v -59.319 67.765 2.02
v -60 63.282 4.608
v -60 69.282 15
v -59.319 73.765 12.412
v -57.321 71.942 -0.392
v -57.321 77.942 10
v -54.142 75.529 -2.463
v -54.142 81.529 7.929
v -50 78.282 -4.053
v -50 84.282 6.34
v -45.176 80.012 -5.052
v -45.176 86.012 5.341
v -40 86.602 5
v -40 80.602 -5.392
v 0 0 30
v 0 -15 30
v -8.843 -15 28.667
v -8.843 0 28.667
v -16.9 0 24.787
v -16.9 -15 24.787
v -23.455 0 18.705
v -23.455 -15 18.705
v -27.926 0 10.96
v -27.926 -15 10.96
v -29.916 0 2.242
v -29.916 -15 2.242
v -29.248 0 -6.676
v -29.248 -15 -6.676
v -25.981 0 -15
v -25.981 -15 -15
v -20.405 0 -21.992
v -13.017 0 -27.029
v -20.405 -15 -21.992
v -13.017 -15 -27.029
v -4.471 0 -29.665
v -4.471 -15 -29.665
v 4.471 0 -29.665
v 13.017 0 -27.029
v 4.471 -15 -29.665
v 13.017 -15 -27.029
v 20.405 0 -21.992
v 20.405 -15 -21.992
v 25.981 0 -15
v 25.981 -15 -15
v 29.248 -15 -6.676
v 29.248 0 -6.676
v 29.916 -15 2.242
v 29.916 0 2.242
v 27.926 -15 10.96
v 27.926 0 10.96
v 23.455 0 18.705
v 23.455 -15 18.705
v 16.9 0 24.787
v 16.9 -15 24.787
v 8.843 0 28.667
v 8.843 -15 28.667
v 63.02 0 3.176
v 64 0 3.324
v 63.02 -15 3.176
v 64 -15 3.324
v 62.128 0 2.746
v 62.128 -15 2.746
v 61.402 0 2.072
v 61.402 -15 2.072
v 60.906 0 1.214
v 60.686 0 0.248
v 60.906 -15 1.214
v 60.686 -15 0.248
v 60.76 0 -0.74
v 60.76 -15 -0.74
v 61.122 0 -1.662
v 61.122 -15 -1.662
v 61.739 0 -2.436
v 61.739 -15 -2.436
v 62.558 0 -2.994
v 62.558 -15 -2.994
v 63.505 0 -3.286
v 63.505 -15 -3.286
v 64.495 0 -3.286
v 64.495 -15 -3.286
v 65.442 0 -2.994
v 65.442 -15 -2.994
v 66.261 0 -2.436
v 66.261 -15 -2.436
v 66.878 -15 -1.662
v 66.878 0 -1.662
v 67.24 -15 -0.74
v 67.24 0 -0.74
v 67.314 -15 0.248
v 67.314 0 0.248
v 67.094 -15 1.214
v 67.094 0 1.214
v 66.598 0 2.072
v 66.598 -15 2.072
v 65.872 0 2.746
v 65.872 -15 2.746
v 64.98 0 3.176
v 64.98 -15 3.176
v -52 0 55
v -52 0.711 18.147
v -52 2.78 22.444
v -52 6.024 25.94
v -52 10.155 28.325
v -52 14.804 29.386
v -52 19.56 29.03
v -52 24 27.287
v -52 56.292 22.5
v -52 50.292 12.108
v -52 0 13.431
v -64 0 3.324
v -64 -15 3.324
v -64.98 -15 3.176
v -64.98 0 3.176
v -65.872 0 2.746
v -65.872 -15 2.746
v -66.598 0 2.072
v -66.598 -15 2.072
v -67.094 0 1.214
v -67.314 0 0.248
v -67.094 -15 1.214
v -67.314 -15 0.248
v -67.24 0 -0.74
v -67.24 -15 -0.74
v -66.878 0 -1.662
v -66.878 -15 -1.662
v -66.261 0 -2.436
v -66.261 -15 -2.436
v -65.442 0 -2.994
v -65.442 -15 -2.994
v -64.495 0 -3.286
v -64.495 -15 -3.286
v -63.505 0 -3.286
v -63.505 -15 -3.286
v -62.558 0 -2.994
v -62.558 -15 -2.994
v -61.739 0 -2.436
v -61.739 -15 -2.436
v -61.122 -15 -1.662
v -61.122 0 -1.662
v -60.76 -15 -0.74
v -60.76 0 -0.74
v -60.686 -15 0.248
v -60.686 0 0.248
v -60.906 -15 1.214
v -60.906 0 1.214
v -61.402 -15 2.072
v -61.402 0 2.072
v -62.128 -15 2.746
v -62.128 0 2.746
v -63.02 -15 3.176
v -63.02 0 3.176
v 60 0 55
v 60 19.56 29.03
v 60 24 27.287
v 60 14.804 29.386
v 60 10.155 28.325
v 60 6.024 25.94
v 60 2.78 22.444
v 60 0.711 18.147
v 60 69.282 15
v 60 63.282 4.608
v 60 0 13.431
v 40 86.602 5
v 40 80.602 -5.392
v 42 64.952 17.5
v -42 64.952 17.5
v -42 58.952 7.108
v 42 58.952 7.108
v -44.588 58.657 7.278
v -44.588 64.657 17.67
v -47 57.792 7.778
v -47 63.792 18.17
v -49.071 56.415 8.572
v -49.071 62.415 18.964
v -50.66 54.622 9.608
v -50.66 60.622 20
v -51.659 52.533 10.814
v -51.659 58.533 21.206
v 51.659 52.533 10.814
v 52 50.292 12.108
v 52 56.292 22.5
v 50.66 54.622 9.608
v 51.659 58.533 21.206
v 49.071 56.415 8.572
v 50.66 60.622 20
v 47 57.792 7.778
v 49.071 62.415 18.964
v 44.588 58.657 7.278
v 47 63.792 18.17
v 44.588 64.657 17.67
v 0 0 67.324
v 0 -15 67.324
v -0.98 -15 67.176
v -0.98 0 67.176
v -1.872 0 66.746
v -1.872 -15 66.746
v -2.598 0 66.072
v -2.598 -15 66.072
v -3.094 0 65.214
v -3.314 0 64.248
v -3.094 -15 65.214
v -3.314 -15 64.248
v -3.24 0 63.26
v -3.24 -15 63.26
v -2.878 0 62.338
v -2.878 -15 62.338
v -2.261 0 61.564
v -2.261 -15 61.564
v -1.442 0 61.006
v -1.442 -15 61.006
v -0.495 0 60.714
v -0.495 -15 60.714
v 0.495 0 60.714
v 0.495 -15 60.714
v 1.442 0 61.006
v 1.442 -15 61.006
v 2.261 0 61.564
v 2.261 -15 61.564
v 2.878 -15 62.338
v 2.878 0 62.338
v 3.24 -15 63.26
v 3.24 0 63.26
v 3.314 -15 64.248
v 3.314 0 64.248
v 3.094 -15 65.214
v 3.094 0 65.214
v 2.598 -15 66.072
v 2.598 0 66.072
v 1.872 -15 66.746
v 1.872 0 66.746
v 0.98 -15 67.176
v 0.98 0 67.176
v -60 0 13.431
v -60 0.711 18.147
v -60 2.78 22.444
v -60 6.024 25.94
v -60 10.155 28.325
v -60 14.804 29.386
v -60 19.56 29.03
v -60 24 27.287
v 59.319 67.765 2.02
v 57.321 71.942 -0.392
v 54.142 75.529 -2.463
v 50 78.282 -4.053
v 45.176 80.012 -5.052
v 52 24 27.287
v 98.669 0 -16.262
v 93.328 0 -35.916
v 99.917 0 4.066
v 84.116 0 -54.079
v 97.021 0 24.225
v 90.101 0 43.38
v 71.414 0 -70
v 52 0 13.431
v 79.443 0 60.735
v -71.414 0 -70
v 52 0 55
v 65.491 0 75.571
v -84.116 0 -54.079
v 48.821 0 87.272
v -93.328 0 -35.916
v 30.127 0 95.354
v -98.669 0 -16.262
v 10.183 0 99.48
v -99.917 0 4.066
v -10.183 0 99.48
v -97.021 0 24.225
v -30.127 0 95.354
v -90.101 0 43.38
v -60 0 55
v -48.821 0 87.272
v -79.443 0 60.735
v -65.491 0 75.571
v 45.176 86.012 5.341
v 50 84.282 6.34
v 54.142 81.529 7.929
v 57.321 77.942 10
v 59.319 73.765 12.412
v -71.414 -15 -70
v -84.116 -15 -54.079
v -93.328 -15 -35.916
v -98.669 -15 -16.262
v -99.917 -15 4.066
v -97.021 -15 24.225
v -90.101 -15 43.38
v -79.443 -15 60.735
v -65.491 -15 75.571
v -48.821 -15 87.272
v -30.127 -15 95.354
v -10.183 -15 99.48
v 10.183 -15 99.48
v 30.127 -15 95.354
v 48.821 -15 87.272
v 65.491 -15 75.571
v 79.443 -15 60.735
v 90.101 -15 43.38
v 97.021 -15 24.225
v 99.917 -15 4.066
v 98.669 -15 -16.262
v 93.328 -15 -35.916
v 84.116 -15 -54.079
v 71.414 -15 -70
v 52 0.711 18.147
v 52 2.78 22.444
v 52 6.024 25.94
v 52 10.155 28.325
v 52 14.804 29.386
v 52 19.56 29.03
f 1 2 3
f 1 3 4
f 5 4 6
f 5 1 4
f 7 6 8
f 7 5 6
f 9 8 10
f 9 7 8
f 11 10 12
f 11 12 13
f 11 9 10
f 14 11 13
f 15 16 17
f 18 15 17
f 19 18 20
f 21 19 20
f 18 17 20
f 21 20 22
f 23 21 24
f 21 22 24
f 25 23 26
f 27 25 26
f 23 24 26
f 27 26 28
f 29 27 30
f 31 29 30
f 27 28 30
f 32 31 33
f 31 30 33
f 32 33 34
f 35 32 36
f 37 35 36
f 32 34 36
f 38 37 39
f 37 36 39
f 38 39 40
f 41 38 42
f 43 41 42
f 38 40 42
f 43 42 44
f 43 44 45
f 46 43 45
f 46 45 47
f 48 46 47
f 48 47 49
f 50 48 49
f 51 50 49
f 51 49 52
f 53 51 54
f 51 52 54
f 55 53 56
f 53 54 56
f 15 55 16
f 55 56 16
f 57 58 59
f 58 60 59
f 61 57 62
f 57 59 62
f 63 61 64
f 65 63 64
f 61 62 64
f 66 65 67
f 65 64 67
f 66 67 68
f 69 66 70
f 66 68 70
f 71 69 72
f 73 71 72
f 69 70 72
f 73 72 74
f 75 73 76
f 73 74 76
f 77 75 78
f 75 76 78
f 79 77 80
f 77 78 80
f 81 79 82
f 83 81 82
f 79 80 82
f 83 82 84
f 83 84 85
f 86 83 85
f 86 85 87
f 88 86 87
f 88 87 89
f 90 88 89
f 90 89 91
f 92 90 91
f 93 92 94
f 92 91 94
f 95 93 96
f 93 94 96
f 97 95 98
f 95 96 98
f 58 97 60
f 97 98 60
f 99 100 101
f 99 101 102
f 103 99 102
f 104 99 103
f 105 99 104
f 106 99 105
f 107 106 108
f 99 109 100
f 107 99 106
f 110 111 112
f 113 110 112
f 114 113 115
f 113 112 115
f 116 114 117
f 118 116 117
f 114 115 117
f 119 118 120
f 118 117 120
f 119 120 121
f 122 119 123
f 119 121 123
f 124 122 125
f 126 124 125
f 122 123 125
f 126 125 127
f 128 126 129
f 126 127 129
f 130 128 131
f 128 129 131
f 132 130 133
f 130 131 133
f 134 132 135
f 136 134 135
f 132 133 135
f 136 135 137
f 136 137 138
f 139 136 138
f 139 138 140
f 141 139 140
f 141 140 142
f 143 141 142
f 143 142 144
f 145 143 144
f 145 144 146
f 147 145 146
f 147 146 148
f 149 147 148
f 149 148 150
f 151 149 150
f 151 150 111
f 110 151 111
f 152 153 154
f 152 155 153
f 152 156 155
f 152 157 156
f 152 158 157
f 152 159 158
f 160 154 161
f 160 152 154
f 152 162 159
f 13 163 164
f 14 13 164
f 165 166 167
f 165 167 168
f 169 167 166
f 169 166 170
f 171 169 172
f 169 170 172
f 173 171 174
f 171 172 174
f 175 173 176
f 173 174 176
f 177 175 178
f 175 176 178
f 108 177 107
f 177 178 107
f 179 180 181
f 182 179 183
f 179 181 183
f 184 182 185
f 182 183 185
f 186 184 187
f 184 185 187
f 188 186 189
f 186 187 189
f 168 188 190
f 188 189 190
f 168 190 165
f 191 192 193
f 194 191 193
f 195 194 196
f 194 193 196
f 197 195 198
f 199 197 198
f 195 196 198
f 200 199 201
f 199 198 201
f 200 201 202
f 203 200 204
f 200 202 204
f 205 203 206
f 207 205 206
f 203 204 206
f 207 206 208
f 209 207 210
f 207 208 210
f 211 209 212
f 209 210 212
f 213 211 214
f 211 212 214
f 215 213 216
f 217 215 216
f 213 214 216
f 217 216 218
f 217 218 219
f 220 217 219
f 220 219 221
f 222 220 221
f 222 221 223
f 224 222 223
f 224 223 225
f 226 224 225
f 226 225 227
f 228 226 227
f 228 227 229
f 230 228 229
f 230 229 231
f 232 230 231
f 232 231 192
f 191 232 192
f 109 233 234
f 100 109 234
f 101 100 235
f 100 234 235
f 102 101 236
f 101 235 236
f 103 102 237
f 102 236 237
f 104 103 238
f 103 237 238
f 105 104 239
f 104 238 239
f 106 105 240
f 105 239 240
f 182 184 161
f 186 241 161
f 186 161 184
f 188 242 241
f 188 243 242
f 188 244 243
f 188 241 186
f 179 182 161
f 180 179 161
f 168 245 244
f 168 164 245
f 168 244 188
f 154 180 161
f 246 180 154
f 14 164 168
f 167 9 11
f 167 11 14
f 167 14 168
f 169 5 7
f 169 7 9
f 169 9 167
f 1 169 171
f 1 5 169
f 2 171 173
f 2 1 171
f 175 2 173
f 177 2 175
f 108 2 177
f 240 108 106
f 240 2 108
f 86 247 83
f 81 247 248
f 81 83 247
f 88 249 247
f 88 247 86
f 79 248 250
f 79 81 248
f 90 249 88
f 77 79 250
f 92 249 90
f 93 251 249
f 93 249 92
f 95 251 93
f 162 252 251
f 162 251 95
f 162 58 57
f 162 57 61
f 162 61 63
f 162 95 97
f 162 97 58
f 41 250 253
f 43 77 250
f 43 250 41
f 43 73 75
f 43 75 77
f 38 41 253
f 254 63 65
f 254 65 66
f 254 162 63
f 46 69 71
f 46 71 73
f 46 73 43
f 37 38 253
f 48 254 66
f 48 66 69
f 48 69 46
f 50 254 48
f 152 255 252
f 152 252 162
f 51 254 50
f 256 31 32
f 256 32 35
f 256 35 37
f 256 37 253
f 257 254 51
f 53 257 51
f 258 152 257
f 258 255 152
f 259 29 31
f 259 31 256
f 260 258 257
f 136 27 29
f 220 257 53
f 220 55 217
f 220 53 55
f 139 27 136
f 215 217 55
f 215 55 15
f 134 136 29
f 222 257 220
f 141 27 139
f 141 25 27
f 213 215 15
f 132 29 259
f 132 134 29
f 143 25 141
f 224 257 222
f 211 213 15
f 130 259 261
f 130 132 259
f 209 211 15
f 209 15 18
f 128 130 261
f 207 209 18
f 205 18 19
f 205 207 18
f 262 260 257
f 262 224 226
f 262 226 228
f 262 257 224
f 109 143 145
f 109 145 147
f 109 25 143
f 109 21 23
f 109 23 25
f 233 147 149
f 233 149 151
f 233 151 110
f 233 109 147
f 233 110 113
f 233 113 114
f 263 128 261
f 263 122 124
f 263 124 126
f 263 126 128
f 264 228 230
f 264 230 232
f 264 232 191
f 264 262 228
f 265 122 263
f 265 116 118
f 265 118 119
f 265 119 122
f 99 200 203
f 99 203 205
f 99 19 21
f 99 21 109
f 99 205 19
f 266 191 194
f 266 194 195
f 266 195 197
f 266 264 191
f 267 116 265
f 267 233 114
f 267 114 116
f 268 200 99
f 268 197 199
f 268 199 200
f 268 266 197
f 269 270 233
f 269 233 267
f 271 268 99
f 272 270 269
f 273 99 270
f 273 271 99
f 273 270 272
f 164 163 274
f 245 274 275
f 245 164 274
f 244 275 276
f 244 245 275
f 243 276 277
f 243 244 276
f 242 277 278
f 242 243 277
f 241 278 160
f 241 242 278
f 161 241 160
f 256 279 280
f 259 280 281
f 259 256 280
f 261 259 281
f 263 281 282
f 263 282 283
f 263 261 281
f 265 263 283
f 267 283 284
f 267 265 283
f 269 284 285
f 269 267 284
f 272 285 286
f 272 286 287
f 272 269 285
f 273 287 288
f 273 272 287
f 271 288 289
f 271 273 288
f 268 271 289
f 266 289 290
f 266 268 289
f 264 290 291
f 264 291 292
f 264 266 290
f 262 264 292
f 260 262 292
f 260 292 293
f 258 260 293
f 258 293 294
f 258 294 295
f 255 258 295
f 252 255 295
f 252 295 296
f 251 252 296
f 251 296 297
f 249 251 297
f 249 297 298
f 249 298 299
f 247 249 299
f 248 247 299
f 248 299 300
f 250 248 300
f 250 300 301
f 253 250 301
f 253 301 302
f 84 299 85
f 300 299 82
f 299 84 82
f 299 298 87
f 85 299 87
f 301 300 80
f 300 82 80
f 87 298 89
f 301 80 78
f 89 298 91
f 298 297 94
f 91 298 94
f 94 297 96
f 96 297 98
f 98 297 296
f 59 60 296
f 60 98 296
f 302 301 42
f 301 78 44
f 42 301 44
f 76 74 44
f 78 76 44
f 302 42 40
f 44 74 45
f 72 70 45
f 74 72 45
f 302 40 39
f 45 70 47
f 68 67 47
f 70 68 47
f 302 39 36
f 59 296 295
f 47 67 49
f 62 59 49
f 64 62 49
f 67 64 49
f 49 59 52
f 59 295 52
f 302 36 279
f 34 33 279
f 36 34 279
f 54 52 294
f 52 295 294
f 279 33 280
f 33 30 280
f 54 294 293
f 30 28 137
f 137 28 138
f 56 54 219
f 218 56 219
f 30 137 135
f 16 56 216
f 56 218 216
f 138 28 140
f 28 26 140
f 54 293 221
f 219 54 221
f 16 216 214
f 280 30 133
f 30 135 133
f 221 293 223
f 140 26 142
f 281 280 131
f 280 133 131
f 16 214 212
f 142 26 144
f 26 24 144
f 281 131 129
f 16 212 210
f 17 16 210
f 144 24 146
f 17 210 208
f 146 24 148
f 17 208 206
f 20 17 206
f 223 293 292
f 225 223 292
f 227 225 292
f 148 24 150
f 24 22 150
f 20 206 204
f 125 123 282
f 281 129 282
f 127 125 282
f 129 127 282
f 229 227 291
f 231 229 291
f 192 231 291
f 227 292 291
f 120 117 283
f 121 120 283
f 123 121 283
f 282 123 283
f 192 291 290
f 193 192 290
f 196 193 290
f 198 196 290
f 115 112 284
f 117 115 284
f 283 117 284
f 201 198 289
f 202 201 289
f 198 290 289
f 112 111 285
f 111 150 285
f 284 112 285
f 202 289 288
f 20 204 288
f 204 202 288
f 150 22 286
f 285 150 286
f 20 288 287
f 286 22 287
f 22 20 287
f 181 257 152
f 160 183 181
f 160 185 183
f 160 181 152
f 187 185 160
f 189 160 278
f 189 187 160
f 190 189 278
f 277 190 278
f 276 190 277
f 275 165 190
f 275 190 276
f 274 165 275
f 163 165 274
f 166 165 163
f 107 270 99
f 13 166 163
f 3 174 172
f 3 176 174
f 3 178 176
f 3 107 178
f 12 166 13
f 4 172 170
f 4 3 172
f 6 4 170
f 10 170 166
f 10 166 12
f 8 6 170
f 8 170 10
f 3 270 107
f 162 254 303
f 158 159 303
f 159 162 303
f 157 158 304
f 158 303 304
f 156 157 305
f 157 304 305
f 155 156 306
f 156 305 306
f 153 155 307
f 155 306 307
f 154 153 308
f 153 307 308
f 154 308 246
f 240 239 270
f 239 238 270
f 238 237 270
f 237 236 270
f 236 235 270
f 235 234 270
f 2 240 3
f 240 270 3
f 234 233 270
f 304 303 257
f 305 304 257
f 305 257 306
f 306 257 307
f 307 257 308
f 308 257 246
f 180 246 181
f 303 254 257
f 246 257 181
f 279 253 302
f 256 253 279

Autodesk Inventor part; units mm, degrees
ref_plane "YZ Plane" through (0, 0, 0) normal (1, 0, 0) x (0, 1, 0)
ref_plane "XZ Plane" through (0, 0, 0) normal (0, 1, 0) x (-1, 0, 0)
ref_plane "XY Plane" through (0, 0, 0) normal (0, 0, 1) x (1, 0, 0)
sketch "草图1" plane through (0, 0, 0) normal (0, 1, 0) x (-1, 0, 0)
  circle A0 centre (0, 0) radius 100
  circle A1 centre (0, 0) radius 64 construction
  point P0 (64, 0)
  point P1 (0, 64)
  point P2 (-64, 0)
  dimension "d0" = 200
  dimension "d1" = 128
extrude "拉伸1" add sketch "草图1" against normal blind 15
hole "孔1" at (-64, 0, 0) at (0, 0, 64) at (64, 0, 0) direction (0, -1, 0) diameter 6.647 end through all thread size "M8x1.25" designation "M8" class "6H" standard "GB Metric profile"
hole "孔2" at (0, 0, 0) direction (0, -1, 0) diameter 60 end through all
sketch "草图2" plane through (0, 0, 0) normal (1, 0, 0) x (0, 1, 0)
  line L0 (0, 55) -> (86.6025, 5)
  line L1 (86.6025, 5) -> (80.6025, -5.3923)
  line L2 (80.6025, -5.3923) -> (24, 27.2872)
  line L3 (0, 27.5) -> (0, 0)
  line L4 (0, 0) -> (0, 13.4308)
  arc A0 (24, 27.2872) -> (0, 13.4308) centre (16, 13.4308) ccw
  line L5 (0, -100) -> (0, 100) projected
  line L6 (0, 55) -> (0, 13.4308)
  point P0 (0, 13.4308)
  dimension "d19" = 55
  dimension "d20" = 100
  dimension "d22" = 12
  dimension "d23" = 0
  dimension "d24" = 16
extrude "拉伸2" add sketch "草图2" along normal mid plane 120
sketch "草图3" plane through (-60, 86.6025, 5) normal (0, 0.5, 0.8660254) x (1, 0, 0)
  line L0 (120, -100) -> (0, -100) projected
  line L1 (48.0104, -100) -> (71.9896, -100) projected
  line L2 (120, -100) -> (0, -100) projected
  line L3 (120, -100) -> (112, -100)
  line L4 (112, -100) -> (112, -35)
  line L5 (0, -100) -> (0, -79.2154) projected
  line L6 (0, -100) -> (8, -100)
  line L7 (8, -100) -> (8, -35)
  line L8 (18, -25) -> (102, -25)
  line L9 (112, -100) -> (8, -100)
  arc A0 (18, -25) -> (8, -35) centre (18, -35) ccw
  arc A1 (112, -35) -> (102, -25) centre (102, -35) ccw
  point P0 (60, -72.5)
  point P1 (112, -25)
  point P2 (8, -25)
  dimension "d27" = 8
  dimension "d28" = 75
  dimension "d29" = 8
  dimension "d30" = 75
  dimension "d31" = 10
extrude "拉伸3" cut sketch "草图3" against normal up to surface surface through (0, 0, 0) normal (0, 1, 0)
fillet "圆角1" radius 20 2 edges at (60, 83.6025, -0.1962) (-60, 83.6025, -0.1962)
sketch "草图4" plane through (0, 0, 0) normal (0, 1, 0) x (1, 0, 0)
  circle A0 centre (0, 0) radius 100 projected
  line L0 (0, 0) -> (0, 70)
  line L1 (0, 70) -> (-92.5065, 70)
  line L2 (-92.5065, 70) -> (-88.0231, 170.2178)
  line L3 (-88.0231, 170.2178) -> (67.3235, 163.2683)
  line L4 (67.3235, 163.2683) -> (102.3961, 70)
  line L5 (0, 70) -> (102.3961, 70)
  point P0 (71.4143, 70)
  point P1 (-71.4143, 70)
  dimension "d35" = 70
extrude "拉伸4" cut sketch "草图4" against normal through all contours L5 L1 A0 picked at (-44.3165, 72.9417)
properties part number "2"
